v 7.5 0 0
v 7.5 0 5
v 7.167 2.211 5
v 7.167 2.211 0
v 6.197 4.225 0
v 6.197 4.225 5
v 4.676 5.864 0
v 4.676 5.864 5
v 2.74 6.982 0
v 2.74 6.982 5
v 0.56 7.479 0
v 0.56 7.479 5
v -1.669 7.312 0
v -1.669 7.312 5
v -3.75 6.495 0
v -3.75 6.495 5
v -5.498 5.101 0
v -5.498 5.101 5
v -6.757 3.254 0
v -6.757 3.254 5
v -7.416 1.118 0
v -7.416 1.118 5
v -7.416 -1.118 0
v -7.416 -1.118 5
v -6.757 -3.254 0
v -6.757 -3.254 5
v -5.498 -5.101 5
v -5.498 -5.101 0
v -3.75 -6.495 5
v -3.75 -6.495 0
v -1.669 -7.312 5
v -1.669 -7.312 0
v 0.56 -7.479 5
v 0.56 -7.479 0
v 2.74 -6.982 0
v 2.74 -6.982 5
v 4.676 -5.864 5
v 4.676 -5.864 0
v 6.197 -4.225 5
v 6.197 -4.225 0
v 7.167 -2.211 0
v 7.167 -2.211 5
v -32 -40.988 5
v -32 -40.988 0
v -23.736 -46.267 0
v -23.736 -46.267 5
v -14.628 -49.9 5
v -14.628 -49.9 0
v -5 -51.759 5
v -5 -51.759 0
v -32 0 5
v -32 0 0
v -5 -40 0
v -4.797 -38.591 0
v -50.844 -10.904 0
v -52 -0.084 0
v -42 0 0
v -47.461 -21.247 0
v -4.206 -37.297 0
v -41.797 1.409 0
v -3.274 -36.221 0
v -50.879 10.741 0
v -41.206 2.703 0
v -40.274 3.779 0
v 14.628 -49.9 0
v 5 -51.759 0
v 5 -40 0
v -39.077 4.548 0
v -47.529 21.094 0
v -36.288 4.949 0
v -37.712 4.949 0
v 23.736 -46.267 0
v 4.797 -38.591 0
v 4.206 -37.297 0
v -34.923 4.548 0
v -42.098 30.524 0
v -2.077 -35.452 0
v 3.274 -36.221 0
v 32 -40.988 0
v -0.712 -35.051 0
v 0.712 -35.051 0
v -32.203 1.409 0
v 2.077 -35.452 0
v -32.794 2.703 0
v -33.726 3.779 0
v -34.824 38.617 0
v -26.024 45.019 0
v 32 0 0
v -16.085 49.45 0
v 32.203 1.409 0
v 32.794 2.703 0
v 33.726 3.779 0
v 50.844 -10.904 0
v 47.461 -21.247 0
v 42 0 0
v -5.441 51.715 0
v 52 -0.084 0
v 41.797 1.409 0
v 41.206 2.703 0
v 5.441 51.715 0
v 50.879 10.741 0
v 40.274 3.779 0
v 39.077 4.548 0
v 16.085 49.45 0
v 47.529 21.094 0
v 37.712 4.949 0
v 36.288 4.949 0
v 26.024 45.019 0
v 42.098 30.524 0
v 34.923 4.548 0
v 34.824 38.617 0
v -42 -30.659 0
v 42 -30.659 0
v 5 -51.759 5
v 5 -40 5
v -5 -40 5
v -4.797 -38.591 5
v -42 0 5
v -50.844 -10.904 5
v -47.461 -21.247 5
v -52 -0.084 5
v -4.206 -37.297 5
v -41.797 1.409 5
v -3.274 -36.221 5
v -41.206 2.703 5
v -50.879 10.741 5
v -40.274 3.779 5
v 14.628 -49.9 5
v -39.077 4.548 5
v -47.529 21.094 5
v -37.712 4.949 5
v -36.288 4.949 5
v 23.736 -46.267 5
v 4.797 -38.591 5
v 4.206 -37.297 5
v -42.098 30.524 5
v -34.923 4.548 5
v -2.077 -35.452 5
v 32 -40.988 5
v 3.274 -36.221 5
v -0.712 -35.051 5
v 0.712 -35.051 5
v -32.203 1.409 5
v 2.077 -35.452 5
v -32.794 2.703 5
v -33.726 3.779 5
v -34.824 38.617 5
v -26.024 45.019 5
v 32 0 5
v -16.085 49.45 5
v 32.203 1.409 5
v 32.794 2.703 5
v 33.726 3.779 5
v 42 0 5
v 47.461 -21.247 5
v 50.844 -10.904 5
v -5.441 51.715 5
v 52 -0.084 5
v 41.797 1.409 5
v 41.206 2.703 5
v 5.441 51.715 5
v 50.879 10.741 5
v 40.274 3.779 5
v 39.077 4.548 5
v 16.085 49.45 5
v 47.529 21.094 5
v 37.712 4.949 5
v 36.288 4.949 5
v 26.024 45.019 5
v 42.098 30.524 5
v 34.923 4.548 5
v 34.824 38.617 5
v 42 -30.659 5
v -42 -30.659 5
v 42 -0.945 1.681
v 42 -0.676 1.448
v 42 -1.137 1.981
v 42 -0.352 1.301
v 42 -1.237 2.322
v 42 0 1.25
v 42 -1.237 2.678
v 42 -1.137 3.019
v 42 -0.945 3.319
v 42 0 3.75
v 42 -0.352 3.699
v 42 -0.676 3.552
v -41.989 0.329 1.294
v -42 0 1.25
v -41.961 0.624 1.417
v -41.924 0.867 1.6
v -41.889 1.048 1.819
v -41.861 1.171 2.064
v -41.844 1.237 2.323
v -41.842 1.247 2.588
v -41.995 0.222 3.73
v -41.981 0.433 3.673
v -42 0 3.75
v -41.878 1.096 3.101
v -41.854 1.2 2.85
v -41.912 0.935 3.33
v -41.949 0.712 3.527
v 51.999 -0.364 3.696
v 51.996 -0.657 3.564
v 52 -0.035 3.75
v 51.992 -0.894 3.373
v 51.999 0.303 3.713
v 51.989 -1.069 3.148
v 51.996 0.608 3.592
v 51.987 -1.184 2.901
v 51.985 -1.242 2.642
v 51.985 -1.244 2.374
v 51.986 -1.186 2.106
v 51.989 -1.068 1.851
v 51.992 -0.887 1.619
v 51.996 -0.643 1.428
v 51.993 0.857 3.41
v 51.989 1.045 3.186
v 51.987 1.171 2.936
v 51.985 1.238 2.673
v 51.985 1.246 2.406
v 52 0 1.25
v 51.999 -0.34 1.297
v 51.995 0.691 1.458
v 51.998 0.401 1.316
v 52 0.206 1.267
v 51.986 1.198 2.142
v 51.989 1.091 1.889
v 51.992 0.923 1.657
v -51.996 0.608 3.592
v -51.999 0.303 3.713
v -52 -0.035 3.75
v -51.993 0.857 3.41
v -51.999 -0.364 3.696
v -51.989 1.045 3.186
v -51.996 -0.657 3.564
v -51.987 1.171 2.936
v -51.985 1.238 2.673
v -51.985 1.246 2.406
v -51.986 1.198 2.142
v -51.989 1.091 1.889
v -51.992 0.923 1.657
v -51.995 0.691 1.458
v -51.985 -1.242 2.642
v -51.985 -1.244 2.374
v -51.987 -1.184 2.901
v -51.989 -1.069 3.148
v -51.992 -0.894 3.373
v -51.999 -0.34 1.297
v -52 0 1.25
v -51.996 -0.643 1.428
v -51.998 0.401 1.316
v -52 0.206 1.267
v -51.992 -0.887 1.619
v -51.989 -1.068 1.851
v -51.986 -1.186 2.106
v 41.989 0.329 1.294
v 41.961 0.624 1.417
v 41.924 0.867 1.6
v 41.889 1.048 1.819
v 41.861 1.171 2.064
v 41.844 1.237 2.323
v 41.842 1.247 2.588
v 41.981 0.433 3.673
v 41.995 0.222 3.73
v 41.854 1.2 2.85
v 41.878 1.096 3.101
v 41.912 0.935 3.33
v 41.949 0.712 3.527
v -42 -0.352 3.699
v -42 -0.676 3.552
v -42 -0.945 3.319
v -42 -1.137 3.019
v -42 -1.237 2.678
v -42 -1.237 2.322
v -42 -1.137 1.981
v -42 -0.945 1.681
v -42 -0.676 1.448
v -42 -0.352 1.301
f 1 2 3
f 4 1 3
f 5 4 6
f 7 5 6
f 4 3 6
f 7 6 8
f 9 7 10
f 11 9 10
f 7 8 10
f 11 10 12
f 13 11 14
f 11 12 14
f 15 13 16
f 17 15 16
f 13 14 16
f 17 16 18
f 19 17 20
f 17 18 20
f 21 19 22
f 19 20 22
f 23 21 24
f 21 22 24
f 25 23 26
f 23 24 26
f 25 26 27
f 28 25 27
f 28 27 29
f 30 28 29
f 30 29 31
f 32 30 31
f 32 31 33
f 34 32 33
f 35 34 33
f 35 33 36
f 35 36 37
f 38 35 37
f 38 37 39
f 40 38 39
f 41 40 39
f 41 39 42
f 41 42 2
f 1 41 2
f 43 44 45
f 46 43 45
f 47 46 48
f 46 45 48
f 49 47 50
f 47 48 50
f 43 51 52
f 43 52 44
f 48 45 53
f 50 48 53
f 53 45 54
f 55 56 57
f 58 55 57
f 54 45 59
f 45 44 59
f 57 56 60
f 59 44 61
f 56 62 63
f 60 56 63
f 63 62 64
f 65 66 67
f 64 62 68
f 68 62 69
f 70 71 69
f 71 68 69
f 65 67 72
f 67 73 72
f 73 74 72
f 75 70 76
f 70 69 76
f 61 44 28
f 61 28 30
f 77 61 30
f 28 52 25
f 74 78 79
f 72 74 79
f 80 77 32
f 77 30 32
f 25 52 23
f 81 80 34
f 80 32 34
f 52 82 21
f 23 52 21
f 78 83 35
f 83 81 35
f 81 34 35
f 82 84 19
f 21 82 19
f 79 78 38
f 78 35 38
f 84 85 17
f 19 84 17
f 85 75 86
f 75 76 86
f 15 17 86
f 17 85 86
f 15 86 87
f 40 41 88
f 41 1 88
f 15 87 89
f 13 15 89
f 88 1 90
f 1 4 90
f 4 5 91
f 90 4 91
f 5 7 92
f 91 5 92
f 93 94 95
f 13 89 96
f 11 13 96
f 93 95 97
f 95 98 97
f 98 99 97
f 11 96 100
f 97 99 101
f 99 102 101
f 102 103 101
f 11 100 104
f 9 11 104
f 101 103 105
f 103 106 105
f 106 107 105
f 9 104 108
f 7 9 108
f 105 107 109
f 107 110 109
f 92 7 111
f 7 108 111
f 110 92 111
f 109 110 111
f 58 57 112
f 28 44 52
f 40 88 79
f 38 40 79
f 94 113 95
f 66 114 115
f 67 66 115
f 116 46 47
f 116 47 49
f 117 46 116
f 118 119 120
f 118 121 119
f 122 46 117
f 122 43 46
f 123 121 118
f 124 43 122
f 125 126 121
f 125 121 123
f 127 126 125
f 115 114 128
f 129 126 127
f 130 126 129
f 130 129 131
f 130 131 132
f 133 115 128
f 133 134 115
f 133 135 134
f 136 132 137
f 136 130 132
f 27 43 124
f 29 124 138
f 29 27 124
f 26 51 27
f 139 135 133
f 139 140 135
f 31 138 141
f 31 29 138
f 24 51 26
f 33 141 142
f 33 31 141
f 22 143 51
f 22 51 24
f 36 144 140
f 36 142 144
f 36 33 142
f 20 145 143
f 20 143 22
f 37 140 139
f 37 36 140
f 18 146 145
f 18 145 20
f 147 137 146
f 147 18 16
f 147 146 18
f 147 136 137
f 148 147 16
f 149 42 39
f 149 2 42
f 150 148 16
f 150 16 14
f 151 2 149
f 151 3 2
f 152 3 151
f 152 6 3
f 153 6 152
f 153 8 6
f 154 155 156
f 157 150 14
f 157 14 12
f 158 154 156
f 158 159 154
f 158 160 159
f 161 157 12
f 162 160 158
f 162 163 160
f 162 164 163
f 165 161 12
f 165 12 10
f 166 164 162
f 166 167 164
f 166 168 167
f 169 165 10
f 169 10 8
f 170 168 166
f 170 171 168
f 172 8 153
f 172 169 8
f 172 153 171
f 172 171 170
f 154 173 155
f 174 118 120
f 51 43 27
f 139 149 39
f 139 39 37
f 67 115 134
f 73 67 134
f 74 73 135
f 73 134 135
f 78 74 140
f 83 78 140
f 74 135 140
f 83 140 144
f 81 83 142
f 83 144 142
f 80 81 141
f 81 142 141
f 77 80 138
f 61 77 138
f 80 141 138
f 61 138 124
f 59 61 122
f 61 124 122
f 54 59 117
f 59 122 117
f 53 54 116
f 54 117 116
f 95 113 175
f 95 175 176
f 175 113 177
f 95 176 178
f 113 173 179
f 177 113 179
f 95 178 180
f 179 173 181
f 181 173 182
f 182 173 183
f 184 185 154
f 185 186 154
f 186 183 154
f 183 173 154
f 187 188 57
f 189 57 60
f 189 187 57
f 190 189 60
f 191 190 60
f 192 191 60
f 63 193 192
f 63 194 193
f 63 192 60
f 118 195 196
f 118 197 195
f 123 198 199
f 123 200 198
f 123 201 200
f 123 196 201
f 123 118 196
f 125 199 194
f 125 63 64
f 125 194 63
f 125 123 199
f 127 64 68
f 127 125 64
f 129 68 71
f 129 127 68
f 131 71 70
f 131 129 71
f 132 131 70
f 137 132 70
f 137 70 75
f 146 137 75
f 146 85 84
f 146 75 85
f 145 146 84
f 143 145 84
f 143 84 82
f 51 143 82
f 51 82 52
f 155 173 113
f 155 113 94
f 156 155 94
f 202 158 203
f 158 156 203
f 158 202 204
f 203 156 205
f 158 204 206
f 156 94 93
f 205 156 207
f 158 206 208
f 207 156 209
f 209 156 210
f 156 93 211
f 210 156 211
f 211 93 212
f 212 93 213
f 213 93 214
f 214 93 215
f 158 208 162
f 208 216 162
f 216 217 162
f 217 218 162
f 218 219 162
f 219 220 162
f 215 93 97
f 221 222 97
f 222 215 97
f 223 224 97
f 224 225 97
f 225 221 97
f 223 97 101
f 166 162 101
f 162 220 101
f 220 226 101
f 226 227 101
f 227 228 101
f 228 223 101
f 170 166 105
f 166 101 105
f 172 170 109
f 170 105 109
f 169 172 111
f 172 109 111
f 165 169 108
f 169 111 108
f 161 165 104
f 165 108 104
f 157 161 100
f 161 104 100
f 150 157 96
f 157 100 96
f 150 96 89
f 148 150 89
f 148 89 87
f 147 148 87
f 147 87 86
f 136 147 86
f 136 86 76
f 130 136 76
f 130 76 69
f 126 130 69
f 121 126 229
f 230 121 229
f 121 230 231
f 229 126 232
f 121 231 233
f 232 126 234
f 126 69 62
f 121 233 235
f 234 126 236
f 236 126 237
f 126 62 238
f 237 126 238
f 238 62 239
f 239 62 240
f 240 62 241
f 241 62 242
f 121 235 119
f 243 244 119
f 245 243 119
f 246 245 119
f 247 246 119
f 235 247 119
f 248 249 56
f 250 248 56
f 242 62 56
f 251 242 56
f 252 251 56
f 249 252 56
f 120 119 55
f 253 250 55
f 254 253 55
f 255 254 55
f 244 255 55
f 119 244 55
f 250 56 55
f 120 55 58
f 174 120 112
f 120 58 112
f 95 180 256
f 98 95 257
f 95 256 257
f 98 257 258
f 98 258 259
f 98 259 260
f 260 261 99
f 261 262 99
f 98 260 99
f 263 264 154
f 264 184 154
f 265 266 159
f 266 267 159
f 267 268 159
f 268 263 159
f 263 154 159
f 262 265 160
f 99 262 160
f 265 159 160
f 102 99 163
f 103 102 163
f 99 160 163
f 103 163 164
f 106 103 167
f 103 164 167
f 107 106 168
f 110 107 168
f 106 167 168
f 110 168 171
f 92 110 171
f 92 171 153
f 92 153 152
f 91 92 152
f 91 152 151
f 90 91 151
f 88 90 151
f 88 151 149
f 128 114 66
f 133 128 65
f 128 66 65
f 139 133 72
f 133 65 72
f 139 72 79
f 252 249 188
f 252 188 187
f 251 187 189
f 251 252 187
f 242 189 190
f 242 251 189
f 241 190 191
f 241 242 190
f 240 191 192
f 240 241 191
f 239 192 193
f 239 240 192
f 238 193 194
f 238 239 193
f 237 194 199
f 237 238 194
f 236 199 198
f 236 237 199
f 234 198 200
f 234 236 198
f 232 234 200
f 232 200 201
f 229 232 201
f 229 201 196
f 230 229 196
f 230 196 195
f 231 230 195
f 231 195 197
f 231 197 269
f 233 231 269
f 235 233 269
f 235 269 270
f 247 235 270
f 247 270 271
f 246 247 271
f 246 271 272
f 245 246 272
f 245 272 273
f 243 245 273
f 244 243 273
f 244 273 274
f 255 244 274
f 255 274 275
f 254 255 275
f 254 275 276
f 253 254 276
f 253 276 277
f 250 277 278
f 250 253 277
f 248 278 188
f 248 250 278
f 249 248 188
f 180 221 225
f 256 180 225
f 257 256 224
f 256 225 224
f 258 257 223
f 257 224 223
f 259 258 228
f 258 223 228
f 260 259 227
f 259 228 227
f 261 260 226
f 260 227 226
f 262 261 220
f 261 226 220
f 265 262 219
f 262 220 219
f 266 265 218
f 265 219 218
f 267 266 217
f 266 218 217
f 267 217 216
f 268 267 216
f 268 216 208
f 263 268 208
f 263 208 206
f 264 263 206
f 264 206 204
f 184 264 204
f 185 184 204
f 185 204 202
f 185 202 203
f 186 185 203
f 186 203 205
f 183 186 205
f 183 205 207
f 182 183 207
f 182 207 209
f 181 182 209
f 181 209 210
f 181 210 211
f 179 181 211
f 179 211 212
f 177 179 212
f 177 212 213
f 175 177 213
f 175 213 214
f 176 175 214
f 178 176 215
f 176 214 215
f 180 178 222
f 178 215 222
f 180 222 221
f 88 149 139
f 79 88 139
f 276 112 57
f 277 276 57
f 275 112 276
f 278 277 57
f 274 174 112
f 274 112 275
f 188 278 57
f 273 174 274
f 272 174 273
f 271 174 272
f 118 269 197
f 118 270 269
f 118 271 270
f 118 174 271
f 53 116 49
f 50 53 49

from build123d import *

# Parameters (mm, degrees)
SKETCH1_R              = 52
BOSS_EXTRUDE1_DEPTH    = 5
CUT_EXTRUDE1_DEPTH     = 10
SKETCH3_R              = 7.5
CUT_EXTRUDE2_DEPTH     = 10
M3_TAPPED_HOLE3_REACH  = 118.383
M3_TAPPED_HOLE3_BORE_R = 1.25


with BuildPart() as part:
    # Sketch1 → Boss-Extrude1 (new body)
    with BuildSketch(Plane.XY):
        Circle(SKETCH1_R)
    extrude(amount=BOSS_EXTRUDE1_DEPTH)

    # Sketch2 → Cut-Extrude1 (cut)
    with BuildSketch(Plane.XY.offset(5)):
        with BuildLine():
            Line((32, 0), (32, -45))
            Line((32, -45), (42, -45))
            Line((42, -45), (42, 3.54e-07))
            ThreePointArc((42, 3.54e-07), (36.999999823, 5), (32, 0))
        make_face()
        with BuildLine():
            Line((-5, -39.999999646), (-5, -55))
            Line((-5, -55), (5, -55))
            Line((5, -55), (5, -40))
            ThreePointArc((5, -40), (1.77e-07, -35), (-5, -39.999999646))
        make_face()
        with BuildLine():
            Line((-32, -45), (-42, -45))
            Line((-42, -45), (-42, 3.54e-07))
            ThreePointArc((-42, 3.54e-07), (-36.999999823, 5), (-32, 0))
            Line((-32, 0), (-32, -45))
        make_face()
    extrude(amount=-CUT_EXTRUDE1_DEPTH, mode=Mode.SUBTRACT)

    # Sketch3 → Cut-Extrude2 (cut)
    with BuildSketch(Plane.XY.offset(5)):
        Circle(SKETCH3_R)
    extrude(amount=-CUT_EXTRUDE2_DEPTH, mode=Mode.SUBTRACT)

    # M3 Tapped Hole3 bore → M3 Tapped Hole3 (cut, up to next)
    with BuildSketch(Plane(origin=(52, 0, 0), x_dir=(0, 0, -1), z_dir=(1, 0, 0)), mode=Mode.PRIVATE) as m3_tapped_hole3_sk1:
        with Locations((-2.5, 1.82e-07)):
            Circle(M3_TAPPED_HOLE3_BORE_R)
    m3_tapped_hole3_tool1 = extrude(m3_tapped_hole3_sk1.sketch, amount=-M3_TAPPED_HOLE3_REACH, mode=Mode.PRIVATE) & part.part
    m3_tapped_hole3 = m3_tapped_hole3_tool1.solids().sort_by_distance((52, 0, 2.5))[0]
    add(m3_tapped_hole3, mode=Mode.SUBTRACT)

    # Mirror1: M3 Tapped Hole3 across plane
    add(m3_tapped_hole3.mirror(Plane(origin=(0, 0, 0), x_dir=(0, 0, 1), z_dir=(1, 0, 0))), mode=Mode.SUBTRACT)


solid = part.part
